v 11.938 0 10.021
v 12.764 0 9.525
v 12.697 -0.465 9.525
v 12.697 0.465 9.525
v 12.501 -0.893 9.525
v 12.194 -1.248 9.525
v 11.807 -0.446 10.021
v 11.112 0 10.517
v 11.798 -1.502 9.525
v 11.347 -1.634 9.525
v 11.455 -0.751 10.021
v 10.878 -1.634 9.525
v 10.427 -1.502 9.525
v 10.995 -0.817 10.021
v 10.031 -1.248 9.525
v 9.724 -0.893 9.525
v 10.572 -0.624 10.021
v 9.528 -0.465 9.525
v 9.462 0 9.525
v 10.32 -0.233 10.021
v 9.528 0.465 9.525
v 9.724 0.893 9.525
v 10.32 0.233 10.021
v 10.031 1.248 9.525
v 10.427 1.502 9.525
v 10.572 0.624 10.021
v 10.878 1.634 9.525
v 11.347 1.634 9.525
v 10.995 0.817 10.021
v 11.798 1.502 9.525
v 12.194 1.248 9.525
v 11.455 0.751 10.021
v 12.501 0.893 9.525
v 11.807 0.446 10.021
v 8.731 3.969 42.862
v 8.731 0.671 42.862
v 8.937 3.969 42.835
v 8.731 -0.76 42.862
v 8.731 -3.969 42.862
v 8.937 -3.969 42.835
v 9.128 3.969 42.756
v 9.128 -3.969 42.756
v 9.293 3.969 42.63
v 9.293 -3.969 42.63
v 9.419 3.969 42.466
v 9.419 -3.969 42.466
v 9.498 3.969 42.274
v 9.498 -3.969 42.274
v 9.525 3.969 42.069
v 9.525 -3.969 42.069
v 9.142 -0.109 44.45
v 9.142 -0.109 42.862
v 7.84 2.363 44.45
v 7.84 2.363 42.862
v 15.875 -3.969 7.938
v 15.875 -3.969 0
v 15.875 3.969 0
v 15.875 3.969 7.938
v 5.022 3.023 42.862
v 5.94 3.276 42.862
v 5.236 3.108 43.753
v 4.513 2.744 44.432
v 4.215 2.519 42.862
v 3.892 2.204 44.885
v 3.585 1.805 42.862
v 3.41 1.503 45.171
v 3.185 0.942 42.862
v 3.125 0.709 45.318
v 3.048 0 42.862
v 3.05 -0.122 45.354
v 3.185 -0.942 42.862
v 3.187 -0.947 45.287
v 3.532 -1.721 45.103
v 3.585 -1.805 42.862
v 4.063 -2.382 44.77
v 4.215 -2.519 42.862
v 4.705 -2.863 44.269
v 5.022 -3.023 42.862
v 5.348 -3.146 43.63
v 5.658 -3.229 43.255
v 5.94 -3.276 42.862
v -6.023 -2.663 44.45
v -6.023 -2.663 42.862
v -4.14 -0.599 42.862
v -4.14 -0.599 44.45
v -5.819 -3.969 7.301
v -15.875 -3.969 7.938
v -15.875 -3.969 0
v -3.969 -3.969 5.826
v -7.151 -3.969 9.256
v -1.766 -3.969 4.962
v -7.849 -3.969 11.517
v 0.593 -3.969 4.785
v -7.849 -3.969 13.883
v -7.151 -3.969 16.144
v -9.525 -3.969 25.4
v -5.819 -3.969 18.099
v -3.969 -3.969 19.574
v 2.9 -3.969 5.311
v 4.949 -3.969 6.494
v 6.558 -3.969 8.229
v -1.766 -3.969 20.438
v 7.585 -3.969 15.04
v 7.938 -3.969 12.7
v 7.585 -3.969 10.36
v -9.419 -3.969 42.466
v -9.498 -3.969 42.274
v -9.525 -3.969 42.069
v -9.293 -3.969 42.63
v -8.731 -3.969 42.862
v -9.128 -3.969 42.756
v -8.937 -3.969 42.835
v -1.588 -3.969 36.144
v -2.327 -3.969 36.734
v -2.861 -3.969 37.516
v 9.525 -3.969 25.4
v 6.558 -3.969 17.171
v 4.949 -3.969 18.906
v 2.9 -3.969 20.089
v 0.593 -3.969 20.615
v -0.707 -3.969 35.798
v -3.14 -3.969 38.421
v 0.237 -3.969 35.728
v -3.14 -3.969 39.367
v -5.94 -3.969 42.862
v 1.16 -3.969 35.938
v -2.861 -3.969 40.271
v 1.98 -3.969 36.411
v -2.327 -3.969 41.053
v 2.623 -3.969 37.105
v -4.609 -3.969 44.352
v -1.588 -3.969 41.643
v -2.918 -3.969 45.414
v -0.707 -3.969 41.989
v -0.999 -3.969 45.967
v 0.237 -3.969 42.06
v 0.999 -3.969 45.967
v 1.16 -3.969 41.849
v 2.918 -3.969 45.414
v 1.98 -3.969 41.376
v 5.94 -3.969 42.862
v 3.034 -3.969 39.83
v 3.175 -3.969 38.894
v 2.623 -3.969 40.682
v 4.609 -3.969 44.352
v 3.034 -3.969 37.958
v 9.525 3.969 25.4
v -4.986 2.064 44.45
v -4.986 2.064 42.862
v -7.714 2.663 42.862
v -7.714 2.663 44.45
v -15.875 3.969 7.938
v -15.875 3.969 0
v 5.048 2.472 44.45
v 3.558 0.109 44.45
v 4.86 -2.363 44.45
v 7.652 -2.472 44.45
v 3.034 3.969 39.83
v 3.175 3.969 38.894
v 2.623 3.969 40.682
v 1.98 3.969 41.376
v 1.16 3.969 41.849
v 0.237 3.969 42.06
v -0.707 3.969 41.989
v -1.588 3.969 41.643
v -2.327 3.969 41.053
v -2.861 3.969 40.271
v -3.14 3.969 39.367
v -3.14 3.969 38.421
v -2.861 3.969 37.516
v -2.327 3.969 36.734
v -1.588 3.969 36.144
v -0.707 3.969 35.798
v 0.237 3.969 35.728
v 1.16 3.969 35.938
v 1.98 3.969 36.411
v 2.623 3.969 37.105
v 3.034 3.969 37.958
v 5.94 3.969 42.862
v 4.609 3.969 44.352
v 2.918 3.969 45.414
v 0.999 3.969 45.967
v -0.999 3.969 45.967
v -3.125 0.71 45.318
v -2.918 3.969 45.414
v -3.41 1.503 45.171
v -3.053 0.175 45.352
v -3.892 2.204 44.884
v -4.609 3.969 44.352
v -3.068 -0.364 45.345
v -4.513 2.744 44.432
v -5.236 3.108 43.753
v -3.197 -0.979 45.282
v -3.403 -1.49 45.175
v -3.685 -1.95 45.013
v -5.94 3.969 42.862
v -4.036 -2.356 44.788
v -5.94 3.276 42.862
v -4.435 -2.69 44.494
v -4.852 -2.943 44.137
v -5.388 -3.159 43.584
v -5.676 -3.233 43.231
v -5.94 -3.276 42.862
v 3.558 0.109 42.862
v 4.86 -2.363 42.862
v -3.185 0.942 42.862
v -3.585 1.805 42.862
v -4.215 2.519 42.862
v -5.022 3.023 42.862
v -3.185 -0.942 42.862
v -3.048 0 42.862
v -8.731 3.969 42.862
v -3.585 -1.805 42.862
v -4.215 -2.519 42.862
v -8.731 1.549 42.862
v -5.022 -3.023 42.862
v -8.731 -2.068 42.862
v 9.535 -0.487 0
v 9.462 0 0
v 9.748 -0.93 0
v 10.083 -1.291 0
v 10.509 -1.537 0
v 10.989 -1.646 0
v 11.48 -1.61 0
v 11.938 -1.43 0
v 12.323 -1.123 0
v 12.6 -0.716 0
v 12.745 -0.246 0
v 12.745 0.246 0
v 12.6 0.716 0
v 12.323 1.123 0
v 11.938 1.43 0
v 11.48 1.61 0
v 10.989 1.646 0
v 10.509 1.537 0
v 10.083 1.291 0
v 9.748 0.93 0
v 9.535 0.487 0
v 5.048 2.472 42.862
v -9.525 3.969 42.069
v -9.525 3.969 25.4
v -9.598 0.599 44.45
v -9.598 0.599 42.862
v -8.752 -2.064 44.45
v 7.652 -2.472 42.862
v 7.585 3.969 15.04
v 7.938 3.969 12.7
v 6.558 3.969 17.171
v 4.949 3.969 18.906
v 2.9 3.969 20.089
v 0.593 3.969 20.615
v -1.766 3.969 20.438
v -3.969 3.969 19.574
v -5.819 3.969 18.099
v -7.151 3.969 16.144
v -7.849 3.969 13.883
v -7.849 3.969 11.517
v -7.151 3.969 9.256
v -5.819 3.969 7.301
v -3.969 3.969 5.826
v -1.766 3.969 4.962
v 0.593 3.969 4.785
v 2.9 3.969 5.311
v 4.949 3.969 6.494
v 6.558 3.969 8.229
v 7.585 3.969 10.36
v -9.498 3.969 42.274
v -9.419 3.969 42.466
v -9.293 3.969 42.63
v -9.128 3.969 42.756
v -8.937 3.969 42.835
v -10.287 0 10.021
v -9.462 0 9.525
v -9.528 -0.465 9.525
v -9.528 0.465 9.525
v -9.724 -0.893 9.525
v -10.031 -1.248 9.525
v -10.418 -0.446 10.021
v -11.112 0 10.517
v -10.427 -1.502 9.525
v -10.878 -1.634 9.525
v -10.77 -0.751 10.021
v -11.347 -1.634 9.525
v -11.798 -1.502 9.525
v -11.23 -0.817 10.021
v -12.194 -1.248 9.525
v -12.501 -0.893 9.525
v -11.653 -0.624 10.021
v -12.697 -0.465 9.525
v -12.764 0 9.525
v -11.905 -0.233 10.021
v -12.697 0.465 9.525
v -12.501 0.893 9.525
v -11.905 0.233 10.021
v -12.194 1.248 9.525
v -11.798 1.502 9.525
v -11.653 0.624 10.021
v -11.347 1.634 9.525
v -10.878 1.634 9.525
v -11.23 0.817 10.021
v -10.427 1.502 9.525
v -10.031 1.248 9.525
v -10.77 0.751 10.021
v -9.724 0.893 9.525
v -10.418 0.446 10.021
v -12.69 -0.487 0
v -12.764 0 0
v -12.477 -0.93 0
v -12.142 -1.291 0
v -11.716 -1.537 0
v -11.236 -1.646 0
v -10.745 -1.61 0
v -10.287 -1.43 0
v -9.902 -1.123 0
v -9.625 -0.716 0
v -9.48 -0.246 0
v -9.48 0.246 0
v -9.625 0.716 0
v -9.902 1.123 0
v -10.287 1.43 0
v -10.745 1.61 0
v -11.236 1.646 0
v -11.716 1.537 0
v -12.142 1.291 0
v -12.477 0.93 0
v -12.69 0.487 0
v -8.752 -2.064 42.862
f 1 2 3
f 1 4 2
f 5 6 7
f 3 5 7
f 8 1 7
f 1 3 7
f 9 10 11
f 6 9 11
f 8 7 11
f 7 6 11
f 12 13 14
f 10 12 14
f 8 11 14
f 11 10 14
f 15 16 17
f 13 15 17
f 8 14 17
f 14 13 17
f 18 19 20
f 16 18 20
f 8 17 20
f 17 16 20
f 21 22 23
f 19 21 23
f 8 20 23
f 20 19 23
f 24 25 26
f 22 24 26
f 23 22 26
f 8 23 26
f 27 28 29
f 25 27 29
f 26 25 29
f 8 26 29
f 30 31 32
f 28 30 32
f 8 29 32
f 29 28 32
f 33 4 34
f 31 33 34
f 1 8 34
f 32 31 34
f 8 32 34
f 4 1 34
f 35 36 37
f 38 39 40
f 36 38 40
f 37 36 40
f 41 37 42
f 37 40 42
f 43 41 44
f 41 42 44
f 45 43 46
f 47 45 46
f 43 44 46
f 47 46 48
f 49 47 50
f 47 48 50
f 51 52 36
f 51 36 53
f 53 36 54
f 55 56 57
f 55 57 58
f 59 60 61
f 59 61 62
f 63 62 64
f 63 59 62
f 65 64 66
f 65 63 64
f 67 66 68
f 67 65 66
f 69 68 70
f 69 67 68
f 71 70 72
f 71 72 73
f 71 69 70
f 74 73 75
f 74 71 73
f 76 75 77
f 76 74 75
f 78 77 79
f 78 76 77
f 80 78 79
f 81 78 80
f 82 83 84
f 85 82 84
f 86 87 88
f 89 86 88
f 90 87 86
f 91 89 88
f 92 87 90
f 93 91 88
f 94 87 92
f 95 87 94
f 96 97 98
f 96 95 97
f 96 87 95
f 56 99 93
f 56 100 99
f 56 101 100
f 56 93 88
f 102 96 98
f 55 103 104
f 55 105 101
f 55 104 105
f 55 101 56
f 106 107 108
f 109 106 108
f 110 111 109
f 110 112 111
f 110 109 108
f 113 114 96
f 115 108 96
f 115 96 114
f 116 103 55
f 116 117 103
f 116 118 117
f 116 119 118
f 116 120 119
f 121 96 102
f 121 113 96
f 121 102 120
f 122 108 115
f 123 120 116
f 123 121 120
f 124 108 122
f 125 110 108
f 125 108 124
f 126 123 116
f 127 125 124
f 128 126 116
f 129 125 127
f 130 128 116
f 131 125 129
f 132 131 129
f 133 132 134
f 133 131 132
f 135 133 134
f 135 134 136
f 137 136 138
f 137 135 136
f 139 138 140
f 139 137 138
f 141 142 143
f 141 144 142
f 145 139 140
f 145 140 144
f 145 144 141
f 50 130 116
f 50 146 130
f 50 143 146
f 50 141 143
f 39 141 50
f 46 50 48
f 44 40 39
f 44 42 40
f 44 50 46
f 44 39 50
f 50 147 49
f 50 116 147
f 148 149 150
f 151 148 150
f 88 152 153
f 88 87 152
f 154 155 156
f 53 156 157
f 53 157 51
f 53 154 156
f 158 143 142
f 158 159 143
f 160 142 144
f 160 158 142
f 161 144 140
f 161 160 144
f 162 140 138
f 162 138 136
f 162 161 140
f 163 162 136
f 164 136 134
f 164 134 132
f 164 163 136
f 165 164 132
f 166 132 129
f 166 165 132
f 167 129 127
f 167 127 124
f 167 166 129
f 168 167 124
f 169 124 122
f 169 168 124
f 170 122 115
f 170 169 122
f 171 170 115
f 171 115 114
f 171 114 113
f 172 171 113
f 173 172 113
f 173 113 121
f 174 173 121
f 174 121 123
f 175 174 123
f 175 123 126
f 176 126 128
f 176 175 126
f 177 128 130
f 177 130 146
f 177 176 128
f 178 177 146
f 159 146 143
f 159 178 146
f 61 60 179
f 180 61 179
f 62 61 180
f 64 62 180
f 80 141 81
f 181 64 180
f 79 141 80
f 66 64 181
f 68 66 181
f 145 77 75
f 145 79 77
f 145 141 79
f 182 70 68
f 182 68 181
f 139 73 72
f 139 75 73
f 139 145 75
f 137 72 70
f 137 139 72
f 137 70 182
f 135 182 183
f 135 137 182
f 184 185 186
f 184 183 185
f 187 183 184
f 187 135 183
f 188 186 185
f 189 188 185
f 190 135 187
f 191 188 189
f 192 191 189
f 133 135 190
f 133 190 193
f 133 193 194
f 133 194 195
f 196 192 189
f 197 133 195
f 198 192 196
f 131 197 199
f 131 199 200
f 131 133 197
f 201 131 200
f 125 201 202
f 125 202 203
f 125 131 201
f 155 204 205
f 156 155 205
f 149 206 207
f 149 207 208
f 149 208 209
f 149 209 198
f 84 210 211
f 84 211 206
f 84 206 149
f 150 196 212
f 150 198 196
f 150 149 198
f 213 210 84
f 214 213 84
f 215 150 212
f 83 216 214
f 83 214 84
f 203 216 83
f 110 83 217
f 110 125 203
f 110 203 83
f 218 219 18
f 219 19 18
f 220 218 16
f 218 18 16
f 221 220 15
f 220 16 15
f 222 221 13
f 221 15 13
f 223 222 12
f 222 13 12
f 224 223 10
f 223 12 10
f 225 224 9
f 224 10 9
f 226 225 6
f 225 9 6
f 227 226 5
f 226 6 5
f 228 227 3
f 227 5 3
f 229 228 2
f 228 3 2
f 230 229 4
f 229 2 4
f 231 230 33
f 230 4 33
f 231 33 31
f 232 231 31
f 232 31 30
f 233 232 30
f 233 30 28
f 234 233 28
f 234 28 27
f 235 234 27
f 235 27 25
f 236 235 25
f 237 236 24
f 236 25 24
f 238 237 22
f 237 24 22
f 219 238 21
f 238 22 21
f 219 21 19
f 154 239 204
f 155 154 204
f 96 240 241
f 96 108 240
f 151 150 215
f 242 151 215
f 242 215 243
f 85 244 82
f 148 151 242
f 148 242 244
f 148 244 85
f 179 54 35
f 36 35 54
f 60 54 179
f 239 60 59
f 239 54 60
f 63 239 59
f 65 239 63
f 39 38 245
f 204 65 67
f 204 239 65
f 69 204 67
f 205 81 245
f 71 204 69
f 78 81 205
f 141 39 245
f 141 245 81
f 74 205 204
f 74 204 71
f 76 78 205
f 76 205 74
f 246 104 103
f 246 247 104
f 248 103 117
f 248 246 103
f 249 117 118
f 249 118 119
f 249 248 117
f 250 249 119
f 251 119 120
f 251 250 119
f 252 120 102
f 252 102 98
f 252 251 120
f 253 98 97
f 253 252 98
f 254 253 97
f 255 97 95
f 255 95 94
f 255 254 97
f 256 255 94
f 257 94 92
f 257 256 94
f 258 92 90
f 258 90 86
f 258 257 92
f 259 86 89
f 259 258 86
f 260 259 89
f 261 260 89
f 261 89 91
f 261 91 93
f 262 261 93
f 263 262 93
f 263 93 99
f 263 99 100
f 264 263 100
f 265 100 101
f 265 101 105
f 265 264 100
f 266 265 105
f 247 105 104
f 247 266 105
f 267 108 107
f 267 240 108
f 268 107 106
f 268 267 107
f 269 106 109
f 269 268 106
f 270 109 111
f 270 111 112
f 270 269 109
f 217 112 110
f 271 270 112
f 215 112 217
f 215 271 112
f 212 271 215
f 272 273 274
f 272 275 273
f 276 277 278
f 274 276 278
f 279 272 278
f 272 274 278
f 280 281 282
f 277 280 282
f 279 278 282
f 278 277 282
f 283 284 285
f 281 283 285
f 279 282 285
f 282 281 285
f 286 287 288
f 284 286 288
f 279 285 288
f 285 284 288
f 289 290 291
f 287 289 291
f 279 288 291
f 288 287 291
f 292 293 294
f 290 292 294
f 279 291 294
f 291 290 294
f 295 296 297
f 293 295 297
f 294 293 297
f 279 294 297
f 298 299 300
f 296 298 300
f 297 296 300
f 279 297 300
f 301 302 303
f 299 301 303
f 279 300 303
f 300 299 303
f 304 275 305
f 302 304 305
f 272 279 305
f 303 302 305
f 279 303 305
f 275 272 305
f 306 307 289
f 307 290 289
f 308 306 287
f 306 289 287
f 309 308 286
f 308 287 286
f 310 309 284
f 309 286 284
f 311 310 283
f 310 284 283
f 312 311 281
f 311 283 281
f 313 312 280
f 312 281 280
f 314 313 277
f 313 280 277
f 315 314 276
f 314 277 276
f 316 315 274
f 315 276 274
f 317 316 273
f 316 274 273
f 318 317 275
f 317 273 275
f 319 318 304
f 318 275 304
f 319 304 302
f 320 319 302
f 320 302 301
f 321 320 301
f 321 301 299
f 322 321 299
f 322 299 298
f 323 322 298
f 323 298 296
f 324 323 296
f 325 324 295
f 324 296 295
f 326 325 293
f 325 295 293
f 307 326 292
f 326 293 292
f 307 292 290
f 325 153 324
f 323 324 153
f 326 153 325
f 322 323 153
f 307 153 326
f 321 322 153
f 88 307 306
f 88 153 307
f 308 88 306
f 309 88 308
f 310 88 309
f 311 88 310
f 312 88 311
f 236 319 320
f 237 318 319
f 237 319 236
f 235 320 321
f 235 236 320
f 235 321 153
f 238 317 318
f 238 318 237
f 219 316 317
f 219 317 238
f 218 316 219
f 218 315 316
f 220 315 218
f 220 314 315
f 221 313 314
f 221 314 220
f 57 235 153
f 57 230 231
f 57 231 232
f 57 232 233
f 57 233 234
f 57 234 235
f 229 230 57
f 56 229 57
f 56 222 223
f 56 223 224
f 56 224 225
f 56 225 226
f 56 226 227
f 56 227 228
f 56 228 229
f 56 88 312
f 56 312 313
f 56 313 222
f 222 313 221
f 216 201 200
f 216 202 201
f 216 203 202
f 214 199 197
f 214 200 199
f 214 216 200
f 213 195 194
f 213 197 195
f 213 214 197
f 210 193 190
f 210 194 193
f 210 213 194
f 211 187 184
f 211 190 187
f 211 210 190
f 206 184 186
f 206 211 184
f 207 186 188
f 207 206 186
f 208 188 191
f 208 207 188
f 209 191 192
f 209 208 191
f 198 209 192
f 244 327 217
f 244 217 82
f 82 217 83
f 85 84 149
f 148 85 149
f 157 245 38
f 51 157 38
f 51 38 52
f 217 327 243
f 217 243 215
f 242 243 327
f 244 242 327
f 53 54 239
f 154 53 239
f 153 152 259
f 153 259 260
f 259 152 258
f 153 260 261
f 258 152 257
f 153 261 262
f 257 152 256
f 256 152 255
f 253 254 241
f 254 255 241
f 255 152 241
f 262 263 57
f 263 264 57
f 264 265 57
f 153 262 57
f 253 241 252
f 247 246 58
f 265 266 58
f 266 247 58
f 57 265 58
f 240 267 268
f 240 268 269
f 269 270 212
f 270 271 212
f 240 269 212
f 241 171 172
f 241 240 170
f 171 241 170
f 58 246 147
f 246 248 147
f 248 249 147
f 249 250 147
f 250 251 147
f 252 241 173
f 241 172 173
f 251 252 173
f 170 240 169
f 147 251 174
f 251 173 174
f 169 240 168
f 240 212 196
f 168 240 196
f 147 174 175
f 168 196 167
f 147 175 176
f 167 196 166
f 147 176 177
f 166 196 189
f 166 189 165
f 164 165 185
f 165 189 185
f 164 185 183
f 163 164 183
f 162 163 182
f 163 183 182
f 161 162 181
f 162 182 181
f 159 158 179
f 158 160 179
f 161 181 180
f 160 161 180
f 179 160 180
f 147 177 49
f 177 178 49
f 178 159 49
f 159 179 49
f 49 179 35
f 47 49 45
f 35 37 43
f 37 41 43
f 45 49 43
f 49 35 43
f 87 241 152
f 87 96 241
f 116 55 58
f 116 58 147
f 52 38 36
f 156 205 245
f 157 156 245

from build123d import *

# Parameters (mm, degrees)
F0_R     = 7.9375
F0_R_2   = 3.175
F1_DEPTH = 3.96875
F2_R     = 0.79375
F4_D     = 3.302
F4_DEPTH = 9.525
F4_TIP   = 0.992020882
F6_R     = 3.302
F7_DEPTH = 25.4
F9_DEPTH = 1.5875


with BuildPart() as f1:
    # F0 (on Front) → F1 (new body, symmetric)
    with BuildSketch(Plane.XZ):
        with BuildLine():
            Line((-15.875, 7.9375), (-15.875, 0))
            Line((-15.875, 0), (15.875, 0))
            Line((15.875, 0), (15.875, 7.9375))
            Line((15.875, 7.9375), (9.525, 25.4))
            Line((9.525, 25.4), (9.525, 42.8625))
            Line((9.525, 42.8625), (5.9398811015, 42.8625))
            ThreePointArc((5.9398811015, 42.8625), (0, 46.0375), (-5.9398811015, 42.8625))
            Line((-5.9398811015, 42.8625), (-9.525, 42.8625))
            Line((-9.525, 42.8625), (-9.525, 25.4))
            Line((-9.525, 25.4), (-15.875, 7.9375))
        make_face()
        with Locations((0, 12.7)):
            Circle(F0_R, mode=Mode.SUBTRACT)
        with Locations((0, 38.89375)):
            Circle(F0_R_2, mode=Mode.SUBTRACT)
    extrude(amount=F1_DEPTH, both=True)

    # F2
    f2_edges = [f1.edges().sort_by_distance(p)[0] for p in [
        (-9.525, 0, 42.8625),
        (9.525, 0, 42.8625),
    ]]
    fillet(f2_edges, radius=F2_R)

    # F4
    with Locations(Plane(origin=(0, 0, 0), x_dir=(1, 0, 0), z_dir=(0, 0, -1))):
        with Locations((-11.1125, 0), (11.1125, 0)):
            Hole(F4_D / 2, depth=F4_DEPTH)
            with Locations((0, 0, -(F4_DEPTH + F4_TIP / 2))):  # 118° drill point
                Cone(0, F4_D / 2, F4_TIP, mode=Mode.SUBTRACT)

    # F6 (on offset) → F7 (cut)
    with BuildSketch(Plane.XY.offset(42.8625)):
        with Locations((-6.35, 0)):
            Circle(F6_R)
        with Locations((6.35, 0)):
            Circle(F6_R)
    extrude(amount=F7_DEPTH, mode=Mode.SUBTRACT)

    # F8 (on offset) → F9 (join)
    with BuildSketch(Plane.XY.offset(42.8625)):
        Polygon((-4.9855054388, 2.0637681785), (-7.7144945612, 2.6629796349), (-9.5979214659, 0.5992114563), (-8.7523592481, -2.0637681785), (-6.0233701256, -2.6629796349), (-4.139943221, -0.5992114563), align=None)
        Polygon((9.1418760206, -0.1089233026), (7.8402683574, 2.3633739067), (5.0483923368, 2.4722972093), (3.5581239794, 0.1089233026), (4.8597316426, -2.3633739067), (7.6516076632, -2.4722972093), align=None)
    extrude(amount=F9_DEPTH)


solid = f1.part
